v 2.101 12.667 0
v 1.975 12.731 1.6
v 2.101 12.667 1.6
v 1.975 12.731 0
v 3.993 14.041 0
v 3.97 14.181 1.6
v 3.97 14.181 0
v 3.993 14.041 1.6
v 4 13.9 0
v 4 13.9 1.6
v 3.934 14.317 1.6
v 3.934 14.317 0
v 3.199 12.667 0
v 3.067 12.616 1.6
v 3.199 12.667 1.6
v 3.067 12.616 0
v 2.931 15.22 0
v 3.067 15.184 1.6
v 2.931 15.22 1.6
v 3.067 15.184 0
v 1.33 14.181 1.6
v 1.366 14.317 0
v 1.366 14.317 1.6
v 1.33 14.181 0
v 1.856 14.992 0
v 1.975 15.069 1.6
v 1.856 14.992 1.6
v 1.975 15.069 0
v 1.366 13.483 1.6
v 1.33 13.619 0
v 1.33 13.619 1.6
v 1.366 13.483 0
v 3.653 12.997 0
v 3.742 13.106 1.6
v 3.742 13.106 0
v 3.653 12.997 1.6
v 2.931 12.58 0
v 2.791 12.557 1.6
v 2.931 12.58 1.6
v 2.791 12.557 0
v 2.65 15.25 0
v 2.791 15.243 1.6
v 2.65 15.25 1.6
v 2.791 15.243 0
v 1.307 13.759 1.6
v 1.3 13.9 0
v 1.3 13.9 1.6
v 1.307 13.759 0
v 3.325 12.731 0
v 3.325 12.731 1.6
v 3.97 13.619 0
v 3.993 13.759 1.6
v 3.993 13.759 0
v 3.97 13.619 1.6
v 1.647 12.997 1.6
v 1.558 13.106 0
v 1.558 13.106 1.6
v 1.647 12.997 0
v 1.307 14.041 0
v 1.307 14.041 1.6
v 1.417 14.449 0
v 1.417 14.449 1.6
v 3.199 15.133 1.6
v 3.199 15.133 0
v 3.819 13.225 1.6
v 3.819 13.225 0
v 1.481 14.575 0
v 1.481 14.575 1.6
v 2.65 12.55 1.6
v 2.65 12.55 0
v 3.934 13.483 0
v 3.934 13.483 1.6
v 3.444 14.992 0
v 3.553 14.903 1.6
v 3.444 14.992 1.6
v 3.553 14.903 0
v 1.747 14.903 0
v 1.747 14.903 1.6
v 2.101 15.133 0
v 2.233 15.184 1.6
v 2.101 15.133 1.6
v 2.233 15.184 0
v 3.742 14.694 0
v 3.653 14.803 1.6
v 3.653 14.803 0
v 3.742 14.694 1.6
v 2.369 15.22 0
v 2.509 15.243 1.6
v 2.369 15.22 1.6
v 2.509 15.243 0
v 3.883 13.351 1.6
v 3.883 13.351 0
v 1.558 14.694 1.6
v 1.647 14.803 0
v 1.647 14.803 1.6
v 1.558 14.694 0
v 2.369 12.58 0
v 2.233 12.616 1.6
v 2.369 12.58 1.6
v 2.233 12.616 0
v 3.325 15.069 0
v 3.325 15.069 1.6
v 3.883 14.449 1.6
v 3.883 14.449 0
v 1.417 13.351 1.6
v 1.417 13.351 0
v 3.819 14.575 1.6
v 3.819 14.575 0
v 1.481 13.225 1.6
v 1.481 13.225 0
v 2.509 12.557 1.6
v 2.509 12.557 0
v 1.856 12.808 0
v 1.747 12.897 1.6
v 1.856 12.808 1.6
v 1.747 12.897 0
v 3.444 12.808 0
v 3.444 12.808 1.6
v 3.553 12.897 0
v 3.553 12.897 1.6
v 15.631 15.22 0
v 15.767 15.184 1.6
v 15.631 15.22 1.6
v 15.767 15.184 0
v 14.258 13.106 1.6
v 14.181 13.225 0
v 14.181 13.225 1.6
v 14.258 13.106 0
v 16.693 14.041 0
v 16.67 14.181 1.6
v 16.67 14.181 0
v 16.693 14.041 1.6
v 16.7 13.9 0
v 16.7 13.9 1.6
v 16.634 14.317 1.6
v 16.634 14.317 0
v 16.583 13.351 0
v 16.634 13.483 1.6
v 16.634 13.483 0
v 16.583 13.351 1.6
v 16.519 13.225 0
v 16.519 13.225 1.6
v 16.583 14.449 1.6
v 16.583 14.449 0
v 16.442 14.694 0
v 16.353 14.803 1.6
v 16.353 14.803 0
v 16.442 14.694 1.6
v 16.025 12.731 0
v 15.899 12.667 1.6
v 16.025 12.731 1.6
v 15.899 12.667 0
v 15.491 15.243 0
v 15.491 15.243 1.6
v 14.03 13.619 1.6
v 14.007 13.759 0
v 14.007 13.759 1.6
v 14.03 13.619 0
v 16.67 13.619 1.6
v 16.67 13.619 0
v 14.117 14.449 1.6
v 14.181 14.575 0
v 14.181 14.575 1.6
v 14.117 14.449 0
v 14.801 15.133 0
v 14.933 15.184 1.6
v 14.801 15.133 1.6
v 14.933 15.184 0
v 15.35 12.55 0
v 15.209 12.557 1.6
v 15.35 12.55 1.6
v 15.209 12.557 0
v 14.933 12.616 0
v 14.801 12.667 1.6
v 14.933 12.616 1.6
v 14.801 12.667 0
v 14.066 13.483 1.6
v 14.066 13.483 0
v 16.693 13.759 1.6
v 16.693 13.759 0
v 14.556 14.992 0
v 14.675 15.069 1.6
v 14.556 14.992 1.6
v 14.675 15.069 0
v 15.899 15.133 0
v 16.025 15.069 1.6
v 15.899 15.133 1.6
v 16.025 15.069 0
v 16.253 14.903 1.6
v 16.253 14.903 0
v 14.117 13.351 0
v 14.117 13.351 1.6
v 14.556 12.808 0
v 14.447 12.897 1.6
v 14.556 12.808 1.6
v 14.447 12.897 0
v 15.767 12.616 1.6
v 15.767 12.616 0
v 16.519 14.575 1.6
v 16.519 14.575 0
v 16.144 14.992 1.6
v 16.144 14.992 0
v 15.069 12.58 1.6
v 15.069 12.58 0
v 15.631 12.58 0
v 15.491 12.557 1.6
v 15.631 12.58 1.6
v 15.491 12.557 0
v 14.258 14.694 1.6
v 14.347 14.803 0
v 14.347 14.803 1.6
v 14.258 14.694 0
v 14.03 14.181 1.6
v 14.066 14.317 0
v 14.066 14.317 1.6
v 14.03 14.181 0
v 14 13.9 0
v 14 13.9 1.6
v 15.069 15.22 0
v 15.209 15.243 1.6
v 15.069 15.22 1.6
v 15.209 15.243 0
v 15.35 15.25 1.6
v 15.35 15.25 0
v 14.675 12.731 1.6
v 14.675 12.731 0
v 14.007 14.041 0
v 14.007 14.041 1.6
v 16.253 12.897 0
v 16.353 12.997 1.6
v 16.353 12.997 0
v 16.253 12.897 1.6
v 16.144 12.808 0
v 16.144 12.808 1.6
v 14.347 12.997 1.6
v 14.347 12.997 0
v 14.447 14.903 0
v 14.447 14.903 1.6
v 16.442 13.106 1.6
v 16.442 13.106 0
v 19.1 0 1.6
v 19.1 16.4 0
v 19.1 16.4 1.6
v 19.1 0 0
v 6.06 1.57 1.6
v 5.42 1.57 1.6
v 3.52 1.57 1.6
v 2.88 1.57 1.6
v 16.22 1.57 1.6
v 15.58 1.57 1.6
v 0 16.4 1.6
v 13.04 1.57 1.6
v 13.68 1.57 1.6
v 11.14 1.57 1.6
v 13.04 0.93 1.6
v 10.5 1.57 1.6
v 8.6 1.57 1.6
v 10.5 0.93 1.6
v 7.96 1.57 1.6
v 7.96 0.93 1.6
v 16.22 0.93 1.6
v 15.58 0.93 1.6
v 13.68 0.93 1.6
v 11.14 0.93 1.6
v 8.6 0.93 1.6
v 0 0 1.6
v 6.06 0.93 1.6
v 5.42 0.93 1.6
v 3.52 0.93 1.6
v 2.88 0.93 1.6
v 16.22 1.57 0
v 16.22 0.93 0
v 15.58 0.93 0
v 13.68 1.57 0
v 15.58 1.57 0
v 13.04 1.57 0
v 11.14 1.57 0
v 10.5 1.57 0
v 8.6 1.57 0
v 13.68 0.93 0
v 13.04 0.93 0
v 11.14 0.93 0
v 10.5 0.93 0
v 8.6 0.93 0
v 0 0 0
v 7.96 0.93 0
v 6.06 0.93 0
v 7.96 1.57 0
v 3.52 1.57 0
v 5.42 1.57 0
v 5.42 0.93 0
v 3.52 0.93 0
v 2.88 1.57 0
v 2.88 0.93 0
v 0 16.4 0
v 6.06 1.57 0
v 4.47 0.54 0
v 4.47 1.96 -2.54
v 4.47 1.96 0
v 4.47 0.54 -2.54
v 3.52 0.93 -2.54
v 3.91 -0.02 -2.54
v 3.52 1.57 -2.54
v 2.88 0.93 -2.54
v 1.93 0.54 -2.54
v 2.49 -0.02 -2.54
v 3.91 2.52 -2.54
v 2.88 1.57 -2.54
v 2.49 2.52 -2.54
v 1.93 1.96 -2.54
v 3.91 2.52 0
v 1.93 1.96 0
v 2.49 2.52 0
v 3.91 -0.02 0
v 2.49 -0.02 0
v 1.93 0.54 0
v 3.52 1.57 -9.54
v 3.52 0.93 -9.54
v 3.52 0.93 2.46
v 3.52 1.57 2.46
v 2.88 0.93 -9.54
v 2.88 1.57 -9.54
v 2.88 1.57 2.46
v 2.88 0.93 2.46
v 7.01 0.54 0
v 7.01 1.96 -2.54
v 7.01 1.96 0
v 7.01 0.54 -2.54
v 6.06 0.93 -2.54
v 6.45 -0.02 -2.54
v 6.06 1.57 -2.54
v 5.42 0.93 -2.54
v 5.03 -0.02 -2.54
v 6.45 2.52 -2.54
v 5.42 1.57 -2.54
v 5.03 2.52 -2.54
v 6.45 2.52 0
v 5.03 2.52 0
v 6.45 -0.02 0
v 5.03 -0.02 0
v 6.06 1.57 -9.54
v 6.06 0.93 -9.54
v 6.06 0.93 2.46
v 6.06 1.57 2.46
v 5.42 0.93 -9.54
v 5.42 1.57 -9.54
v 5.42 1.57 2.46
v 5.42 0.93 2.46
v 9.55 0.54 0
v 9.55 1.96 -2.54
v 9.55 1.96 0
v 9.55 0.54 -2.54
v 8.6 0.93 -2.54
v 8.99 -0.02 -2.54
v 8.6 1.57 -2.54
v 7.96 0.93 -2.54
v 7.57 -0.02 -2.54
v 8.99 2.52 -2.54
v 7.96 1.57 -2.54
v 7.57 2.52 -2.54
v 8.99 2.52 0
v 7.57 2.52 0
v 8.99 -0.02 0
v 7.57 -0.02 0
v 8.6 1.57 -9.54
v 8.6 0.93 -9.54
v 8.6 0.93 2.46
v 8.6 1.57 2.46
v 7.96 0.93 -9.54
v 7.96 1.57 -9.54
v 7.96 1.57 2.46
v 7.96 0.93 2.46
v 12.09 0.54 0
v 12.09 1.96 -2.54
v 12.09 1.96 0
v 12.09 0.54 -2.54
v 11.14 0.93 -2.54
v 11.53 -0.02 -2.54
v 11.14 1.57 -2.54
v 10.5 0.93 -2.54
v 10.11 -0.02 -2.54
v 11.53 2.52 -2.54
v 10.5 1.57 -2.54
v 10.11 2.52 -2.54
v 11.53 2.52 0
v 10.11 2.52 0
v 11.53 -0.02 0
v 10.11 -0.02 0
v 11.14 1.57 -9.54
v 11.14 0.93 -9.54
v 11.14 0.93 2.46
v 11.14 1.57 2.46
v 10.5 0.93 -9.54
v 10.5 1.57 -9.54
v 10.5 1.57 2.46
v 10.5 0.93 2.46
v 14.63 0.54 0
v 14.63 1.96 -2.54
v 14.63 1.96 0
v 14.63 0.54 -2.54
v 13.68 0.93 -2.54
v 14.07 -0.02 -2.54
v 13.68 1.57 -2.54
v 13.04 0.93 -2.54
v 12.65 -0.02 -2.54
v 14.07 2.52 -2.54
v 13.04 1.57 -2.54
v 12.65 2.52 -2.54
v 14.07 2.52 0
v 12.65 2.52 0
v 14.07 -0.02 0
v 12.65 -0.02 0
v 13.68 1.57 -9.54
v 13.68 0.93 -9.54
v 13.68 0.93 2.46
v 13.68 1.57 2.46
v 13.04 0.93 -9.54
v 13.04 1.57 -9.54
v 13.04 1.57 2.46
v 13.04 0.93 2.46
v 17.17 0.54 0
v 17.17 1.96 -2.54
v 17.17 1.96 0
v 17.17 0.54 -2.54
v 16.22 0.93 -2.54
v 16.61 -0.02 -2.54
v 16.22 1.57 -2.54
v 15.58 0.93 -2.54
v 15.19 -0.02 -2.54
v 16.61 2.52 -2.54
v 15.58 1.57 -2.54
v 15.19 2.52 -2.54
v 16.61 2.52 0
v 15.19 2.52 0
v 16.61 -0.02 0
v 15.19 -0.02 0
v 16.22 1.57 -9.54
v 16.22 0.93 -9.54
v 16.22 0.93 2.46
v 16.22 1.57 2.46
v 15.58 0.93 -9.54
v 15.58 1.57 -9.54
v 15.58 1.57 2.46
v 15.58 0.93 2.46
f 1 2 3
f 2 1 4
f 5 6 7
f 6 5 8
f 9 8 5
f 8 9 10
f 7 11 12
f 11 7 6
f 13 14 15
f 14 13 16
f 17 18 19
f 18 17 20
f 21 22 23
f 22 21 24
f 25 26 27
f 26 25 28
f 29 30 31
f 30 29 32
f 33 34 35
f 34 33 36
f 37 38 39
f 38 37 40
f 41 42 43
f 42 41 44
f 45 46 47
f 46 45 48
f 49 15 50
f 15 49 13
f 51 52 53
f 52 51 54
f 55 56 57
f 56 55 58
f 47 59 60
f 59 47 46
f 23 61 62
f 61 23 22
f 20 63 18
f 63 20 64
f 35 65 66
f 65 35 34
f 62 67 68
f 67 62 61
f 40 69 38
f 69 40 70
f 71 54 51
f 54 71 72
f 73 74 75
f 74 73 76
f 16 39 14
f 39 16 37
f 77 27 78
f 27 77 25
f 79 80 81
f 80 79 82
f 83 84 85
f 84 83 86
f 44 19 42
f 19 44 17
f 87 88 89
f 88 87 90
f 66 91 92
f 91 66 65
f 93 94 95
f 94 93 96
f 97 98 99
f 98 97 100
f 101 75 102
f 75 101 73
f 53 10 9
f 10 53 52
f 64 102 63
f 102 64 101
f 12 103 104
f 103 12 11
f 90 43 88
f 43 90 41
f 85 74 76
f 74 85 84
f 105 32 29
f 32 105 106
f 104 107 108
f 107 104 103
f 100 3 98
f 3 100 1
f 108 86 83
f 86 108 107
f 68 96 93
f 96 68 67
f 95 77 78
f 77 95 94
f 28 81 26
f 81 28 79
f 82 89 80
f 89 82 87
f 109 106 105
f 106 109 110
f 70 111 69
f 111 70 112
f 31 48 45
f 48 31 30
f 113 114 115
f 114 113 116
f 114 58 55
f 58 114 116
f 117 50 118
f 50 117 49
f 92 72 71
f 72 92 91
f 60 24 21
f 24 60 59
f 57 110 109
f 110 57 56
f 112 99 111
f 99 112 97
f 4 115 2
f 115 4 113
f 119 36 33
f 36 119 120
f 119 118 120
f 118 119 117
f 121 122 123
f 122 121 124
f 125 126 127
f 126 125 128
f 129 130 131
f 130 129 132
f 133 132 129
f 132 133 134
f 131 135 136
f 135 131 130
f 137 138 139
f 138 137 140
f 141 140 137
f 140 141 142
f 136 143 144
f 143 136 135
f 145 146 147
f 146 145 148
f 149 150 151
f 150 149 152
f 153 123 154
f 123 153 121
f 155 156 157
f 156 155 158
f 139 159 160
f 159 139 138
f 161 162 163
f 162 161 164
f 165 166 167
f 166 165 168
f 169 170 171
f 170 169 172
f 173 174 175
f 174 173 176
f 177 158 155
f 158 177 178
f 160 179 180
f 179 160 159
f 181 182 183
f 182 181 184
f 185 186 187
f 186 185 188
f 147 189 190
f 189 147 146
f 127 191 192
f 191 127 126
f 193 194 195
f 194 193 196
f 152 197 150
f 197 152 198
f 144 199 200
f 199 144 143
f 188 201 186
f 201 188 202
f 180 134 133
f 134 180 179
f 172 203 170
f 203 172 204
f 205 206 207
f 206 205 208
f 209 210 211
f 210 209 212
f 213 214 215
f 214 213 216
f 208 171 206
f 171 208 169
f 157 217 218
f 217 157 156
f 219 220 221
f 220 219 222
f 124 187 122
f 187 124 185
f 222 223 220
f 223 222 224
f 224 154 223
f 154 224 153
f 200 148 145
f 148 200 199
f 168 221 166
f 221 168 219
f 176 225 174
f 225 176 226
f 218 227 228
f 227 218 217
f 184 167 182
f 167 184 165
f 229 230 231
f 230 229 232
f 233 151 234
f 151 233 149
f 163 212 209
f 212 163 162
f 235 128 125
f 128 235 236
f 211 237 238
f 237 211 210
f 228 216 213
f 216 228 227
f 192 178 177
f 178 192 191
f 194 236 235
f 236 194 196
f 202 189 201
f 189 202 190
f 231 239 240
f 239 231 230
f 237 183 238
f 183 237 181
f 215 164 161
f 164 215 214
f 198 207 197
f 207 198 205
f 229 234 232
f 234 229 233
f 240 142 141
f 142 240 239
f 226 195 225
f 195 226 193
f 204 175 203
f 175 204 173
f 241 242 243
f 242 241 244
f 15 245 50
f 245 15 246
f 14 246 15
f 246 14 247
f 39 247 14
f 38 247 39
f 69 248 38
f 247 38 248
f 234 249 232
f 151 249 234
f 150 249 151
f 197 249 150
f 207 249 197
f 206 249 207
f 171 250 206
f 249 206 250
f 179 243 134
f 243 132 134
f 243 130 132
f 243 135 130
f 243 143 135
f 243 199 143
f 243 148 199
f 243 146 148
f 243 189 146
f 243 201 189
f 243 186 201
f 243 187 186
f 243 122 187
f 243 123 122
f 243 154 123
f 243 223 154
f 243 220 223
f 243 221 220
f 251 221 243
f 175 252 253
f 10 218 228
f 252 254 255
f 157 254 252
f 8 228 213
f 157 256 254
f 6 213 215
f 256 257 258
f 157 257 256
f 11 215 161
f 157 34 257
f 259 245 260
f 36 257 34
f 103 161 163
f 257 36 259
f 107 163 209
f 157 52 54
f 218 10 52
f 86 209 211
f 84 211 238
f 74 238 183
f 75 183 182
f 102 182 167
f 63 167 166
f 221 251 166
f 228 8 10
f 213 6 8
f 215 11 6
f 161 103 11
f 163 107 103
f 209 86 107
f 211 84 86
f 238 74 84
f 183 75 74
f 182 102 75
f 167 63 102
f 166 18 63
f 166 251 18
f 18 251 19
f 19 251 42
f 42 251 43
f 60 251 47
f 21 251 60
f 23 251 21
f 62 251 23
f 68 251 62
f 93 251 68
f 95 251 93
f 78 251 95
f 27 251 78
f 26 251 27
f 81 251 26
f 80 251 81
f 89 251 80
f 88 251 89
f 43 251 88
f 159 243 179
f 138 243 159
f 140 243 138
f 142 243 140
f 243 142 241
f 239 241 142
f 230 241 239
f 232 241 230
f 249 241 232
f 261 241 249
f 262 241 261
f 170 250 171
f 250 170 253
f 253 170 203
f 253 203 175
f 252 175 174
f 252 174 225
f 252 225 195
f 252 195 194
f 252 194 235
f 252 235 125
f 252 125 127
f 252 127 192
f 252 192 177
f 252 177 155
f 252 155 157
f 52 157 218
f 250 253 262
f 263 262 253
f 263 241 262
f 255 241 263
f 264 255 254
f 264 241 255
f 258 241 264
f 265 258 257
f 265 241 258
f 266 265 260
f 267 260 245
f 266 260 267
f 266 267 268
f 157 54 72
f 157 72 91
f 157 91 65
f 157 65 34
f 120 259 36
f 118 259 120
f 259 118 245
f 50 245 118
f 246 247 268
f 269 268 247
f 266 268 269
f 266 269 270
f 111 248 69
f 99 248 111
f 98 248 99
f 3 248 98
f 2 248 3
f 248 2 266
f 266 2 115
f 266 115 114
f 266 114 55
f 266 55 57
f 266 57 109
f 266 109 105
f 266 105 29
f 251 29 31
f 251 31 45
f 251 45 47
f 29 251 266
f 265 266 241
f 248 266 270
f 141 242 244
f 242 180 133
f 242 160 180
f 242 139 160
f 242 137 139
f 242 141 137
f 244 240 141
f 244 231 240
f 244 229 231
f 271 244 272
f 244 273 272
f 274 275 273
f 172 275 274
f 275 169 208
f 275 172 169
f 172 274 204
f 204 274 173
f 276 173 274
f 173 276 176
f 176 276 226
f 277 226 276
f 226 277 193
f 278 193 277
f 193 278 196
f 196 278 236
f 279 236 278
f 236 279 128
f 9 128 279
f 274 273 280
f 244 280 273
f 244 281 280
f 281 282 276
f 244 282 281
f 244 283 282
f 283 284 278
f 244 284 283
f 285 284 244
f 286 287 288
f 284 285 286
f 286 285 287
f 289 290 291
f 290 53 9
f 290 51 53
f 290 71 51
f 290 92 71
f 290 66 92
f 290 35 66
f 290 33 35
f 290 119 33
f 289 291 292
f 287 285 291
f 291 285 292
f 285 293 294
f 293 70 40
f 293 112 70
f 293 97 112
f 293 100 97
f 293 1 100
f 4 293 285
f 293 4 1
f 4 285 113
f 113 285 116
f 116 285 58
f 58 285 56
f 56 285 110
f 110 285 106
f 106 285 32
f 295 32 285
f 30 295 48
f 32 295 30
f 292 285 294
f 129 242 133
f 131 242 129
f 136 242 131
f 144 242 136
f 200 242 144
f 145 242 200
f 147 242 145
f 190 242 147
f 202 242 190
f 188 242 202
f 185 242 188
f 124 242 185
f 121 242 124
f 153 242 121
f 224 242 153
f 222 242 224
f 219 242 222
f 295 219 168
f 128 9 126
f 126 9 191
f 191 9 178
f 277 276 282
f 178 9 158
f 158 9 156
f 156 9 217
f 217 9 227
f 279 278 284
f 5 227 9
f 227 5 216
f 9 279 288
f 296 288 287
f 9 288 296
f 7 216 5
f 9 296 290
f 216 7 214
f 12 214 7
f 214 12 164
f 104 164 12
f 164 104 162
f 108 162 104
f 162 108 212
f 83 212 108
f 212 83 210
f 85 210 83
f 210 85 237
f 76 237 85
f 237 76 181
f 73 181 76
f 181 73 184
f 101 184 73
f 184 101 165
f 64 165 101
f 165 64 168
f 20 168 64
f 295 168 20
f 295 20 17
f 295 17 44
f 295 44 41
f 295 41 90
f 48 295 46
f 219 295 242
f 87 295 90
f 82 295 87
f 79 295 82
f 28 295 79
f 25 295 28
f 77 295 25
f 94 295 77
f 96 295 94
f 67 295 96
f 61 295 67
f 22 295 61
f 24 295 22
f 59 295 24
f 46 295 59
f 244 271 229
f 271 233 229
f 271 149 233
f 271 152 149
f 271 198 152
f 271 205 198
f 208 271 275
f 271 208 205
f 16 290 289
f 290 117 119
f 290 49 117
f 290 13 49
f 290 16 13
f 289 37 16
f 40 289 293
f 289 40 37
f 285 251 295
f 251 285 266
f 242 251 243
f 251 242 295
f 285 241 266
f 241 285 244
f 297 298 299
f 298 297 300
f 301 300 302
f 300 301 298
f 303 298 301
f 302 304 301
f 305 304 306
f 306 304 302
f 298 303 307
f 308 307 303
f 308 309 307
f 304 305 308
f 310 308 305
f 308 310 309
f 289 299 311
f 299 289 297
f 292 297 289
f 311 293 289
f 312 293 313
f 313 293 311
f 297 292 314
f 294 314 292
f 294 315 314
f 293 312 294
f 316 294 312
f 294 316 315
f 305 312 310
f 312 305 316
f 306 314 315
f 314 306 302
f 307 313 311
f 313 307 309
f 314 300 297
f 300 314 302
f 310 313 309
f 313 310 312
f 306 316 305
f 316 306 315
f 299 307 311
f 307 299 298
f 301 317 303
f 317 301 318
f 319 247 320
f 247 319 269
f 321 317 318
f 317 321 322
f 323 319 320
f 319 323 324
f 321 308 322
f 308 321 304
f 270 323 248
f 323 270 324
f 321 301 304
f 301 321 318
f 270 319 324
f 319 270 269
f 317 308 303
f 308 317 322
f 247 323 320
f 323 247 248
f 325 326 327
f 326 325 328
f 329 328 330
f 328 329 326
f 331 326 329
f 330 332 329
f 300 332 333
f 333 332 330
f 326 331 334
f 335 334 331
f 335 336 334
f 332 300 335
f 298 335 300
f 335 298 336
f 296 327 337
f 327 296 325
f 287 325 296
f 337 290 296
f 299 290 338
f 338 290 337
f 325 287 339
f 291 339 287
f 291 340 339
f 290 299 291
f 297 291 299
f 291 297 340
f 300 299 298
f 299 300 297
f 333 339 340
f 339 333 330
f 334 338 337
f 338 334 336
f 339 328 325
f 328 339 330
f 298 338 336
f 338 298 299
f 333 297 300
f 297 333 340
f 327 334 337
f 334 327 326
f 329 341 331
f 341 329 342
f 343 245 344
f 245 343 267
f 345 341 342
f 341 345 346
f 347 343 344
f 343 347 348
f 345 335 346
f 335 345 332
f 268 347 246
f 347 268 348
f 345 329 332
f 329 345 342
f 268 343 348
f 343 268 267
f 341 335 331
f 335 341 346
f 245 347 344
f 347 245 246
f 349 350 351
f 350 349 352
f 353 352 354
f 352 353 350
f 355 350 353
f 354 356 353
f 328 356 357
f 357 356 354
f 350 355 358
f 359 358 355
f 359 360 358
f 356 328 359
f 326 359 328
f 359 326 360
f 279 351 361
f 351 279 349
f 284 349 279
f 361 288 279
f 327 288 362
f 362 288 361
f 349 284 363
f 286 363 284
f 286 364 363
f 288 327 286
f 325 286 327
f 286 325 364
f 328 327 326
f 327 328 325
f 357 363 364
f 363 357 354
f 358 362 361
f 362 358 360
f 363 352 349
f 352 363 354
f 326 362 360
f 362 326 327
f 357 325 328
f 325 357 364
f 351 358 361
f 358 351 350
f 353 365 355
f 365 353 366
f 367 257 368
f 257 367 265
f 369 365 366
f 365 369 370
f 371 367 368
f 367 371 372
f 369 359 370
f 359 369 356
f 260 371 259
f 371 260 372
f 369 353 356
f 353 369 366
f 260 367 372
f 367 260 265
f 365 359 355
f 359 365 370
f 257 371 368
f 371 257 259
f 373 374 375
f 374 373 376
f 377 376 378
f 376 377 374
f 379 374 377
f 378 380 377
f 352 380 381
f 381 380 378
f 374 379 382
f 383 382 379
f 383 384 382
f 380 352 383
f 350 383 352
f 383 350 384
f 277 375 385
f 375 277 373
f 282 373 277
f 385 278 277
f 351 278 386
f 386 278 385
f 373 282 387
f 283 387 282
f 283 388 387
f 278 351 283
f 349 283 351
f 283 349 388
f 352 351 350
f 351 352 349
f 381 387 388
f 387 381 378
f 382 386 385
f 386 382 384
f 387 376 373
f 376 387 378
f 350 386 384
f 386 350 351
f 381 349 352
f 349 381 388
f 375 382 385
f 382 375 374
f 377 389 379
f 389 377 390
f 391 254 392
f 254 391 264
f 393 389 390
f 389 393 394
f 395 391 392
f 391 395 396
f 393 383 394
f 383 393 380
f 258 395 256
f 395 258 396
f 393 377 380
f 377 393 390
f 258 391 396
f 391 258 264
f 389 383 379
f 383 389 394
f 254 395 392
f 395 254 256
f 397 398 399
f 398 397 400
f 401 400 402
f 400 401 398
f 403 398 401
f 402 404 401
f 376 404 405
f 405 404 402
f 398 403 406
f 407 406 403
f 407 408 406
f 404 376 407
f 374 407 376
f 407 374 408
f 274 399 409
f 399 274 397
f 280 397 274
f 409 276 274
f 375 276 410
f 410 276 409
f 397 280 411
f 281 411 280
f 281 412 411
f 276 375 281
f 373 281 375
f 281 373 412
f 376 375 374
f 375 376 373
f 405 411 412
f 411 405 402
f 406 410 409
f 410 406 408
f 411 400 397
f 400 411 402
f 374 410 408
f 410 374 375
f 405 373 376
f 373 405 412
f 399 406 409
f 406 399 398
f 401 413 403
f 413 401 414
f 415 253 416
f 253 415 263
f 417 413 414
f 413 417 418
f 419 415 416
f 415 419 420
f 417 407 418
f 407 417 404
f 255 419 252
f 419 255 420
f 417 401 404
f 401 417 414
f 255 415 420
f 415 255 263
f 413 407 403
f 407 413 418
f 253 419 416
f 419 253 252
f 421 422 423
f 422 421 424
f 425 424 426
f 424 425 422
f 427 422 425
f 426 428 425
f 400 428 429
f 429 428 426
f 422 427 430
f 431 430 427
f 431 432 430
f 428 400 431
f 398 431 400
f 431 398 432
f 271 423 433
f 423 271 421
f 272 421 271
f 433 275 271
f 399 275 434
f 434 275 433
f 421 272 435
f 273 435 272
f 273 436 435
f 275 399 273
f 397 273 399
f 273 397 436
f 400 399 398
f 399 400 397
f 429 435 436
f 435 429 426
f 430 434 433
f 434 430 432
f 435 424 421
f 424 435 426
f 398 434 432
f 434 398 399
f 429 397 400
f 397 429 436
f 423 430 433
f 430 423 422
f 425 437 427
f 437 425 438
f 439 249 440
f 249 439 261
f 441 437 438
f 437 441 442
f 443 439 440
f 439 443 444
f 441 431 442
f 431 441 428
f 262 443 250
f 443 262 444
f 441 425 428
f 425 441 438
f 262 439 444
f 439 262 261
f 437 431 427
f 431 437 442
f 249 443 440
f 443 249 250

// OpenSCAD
// file: pin_headers.scad
// pin_headers.scad
//
// Model of through-hole pin headers. 
// 
// Units are metric
//
// "height" is the total length of the pin. Default is 12mm.
// "upper" is the length of the pin above the stopper. Default is 7mm.
// "rows" is the number of rows. Default is 3.
// "cols" is the number of columns. Default is 2.
//
// Examples:
// pin_header( 12, 7, 2, 5);
// pin_header( rows=5 cols=1 );
// By Paul McGovern

module pin_header( height=12, upper=7, rows=3, cols=2 ) {

	cl = 2.54;

	translate( [ -(rows  * cl/2 ) + cl /2, -(cols  * cl/2 ) + cl /2, 0 ] ) {

		for( col = [0: cols -1 ] ) {
			for( row = [0 : rows -1 ] ) {

				translate( [ cl * row , cl * col, 0] ) {
	
					color( "gray" )
						translate( [0,0, cl / 2]) {
							intersection() {
								cube( [ cl, cl, cl ], center=true );
								rotate( [0, 0, 45] ) cube( [ 2.8, 2.8, cl ], center=true );
						}
				}

				color( "silver" ) {
					translate( [0,0, (upper - ( height/2 )) + cl ] ) {
						union() {
							cube( [0.64,0.64,height], center=true );
							translate( [0,0, height/2 ] ) scale( 0.64 ) _pin_point();
							translate( [0,0, -height/2 ] ) scale( 0.64 )	rotate([180,0,0] )_pin_point();
						}
					}
				}
			}
		}
	}
}
}

module _pin_point() {
	translate( [-0.5,-0.5, 0])
		polyhedron( 
			points=[[0,0,0],[0,1,0],[1,1,0],[1,0,0],[0.5,0.5,0.5]], 
			triangles=[[0,1,2],[0,2,3],[0,1,4],[1,2,4],[2,3,4],[3,0,4]]);
}
// file: sensor_modules.scad
// Sensor modules from Adafruit
// License GNU AFFERO GENERAL PUBLIC LICENSE v3+
// Copyright 2014 Christian Ege <k4230r6@gmail.com>


use <pin_headers.scad>;

sensor_drill_holes = 2.3;
sensor_z = 1.6;

// Humidity
htu21d_x = 16.5;
htu21d_y = 18.2;
htu21d_z = sensor_z;
htu21d_holes = [  [2.45,15.75],  [13.75,15.75]];

// Lux - Sensor
tsl2591_x = 19.1;
tsl2591_y = 16.4;
tsl2591_z = sensor_z;
tsl2591_holes = [ [2.45,13.7],  [15.15,13.7] ];

// Presure Sensor
bmp180_x = 17.6;
bmp180_y = 19.3;
bmp180_z = sensor_z;
bmp180_holes = [  [2.45,17.0],  [15.15,17.0]  ];


module base_sensor(clearance = 0,  size , holes, drill,rows) {
	echo( "size: ",size[0],size[1],size[2]);
	echo ("holes: ",holes);
	echo("drill: ", drill);
	echo("clearance:",clearance);
	difference () {
		cube(size);
		for(i = holes ) {
			translate ([clearance,clearance,-clearance]) {
				translate (i) {
					#cylinder(h =  size[2]+2*clearance , r=((drill/2)+clearance), $fn=60 ) ;
				}
			}
		}
	}
	translate([(size[0])/2,+1.25,0]) {
		rotate([180,0,0]) {
			pin_header(rows=rows,cols=1);
		}
	}
}


module htu21d (clearance = 0.0,drill=sensor_drill_holes)  {
	base_sensor(clearance = clearance, size=[htu21d_x,htu21d_y,htu21d_z], holes=htu21d_holes, drill=drill,rows=5) ;
}

module tsl2591 (clearance=0.0,drill=sensor_drill_holes )  {
	base_sensor(clearance = clearance, size=[tsl2591_x,tsl2591_y,tsl2591_z], holes=tsl2591_holes, drill=drill,rows=6) ;
}

module bmp180 (clearance=0.0, drill=sensor_drill_holes )  {
	base_sensor(clearance=clearance, size=[bmp180_x,bmp180_y,bmp180_z], holes=bmp180_holes, drill=drill,rows=5) ;
}

//bmp180(clearance=0.2, drill = sensor_drill_holes);
//tsl2591 (clearance=0.2, drill = sensor_drill_holes );
htu21d(clearance=0.2, drill = sensor_drill_holes );
// main file
// Sensor TSL2591 module from Adafruit
// https://www.adafruit.com/products/1980
//
// License GNU AFFERO GENERAL PUBLIC LICENSE v3+
// Copyright 2014 Christian Ege <k4230r6@gmail.com>

use <sensor_modules.scad>;

tsl2591(clearance=0.2);
